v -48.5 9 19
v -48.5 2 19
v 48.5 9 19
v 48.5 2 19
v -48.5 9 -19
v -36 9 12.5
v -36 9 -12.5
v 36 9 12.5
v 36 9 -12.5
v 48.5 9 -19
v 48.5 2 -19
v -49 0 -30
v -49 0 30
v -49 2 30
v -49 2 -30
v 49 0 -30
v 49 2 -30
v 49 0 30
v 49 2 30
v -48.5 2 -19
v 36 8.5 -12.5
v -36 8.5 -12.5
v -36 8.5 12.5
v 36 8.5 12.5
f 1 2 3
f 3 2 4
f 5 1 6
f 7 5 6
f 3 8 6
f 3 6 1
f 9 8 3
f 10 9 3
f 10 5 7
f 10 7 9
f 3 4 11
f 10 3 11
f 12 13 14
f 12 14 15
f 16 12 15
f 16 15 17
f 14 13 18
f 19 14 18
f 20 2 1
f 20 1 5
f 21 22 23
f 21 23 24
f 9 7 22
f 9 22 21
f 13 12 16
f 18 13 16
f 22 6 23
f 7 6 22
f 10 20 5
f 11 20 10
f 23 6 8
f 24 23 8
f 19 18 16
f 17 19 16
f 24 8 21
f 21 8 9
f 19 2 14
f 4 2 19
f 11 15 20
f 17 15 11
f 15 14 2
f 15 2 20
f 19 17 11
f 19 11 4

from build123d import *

# Parameters (mm, degrees)
SKETCH1_W           = 98
SKETCH1_H           = 60
BOSS_EXTRUDE1_DEPTH = 2
SKETCH2_W           = 97
SKETCH2_H           = 38
BOSS_EXTRUDE2_DEPTH = 7
SKETCH4_W           = 72
SKETCH4_H           = 25
CUT_EXTRUDE1_DEPTH  = 0.5


with BuildPart() as part:
    # Sketch1 → Boss-Extrude1 (new body)
    with BuildSketch(Plane(origin=(0, 0, 0), x_dir=(1, 0, 0), z_dir=(0, 1, 0))):
        Rectangle(SKETCH1_W, SKETCH1_H)
    extrude(amount=BOSS_EXTRUDE1_DEPTH)

    # Sketch2 → Boss-Extrude2 (add)
    with BuildSketch(Plane(origin=(0, 2, 0), x_dir=(1, 0, 0), z_dir=(0, 1, 0))):
        Rectangle(SKETCH2_W, SKETCH2_H)
    extrude(amount=BOSS_EXTRUDE2_DEPTH)

    # Sketch4 → Cut-Extrude1 (cut)
    with BuildSketch(Plane(origin=(0, 9, 0), x_dir=(1, 0, 0), z_dir=(0, 1, 0))):
        Rectangle(SKETCH4_W, SKETCH4_H)
    extrude(amount=-CUT_EXTRUDE1_DEPTH, mode=Mode.SUBTRACT)


solid = part.part
